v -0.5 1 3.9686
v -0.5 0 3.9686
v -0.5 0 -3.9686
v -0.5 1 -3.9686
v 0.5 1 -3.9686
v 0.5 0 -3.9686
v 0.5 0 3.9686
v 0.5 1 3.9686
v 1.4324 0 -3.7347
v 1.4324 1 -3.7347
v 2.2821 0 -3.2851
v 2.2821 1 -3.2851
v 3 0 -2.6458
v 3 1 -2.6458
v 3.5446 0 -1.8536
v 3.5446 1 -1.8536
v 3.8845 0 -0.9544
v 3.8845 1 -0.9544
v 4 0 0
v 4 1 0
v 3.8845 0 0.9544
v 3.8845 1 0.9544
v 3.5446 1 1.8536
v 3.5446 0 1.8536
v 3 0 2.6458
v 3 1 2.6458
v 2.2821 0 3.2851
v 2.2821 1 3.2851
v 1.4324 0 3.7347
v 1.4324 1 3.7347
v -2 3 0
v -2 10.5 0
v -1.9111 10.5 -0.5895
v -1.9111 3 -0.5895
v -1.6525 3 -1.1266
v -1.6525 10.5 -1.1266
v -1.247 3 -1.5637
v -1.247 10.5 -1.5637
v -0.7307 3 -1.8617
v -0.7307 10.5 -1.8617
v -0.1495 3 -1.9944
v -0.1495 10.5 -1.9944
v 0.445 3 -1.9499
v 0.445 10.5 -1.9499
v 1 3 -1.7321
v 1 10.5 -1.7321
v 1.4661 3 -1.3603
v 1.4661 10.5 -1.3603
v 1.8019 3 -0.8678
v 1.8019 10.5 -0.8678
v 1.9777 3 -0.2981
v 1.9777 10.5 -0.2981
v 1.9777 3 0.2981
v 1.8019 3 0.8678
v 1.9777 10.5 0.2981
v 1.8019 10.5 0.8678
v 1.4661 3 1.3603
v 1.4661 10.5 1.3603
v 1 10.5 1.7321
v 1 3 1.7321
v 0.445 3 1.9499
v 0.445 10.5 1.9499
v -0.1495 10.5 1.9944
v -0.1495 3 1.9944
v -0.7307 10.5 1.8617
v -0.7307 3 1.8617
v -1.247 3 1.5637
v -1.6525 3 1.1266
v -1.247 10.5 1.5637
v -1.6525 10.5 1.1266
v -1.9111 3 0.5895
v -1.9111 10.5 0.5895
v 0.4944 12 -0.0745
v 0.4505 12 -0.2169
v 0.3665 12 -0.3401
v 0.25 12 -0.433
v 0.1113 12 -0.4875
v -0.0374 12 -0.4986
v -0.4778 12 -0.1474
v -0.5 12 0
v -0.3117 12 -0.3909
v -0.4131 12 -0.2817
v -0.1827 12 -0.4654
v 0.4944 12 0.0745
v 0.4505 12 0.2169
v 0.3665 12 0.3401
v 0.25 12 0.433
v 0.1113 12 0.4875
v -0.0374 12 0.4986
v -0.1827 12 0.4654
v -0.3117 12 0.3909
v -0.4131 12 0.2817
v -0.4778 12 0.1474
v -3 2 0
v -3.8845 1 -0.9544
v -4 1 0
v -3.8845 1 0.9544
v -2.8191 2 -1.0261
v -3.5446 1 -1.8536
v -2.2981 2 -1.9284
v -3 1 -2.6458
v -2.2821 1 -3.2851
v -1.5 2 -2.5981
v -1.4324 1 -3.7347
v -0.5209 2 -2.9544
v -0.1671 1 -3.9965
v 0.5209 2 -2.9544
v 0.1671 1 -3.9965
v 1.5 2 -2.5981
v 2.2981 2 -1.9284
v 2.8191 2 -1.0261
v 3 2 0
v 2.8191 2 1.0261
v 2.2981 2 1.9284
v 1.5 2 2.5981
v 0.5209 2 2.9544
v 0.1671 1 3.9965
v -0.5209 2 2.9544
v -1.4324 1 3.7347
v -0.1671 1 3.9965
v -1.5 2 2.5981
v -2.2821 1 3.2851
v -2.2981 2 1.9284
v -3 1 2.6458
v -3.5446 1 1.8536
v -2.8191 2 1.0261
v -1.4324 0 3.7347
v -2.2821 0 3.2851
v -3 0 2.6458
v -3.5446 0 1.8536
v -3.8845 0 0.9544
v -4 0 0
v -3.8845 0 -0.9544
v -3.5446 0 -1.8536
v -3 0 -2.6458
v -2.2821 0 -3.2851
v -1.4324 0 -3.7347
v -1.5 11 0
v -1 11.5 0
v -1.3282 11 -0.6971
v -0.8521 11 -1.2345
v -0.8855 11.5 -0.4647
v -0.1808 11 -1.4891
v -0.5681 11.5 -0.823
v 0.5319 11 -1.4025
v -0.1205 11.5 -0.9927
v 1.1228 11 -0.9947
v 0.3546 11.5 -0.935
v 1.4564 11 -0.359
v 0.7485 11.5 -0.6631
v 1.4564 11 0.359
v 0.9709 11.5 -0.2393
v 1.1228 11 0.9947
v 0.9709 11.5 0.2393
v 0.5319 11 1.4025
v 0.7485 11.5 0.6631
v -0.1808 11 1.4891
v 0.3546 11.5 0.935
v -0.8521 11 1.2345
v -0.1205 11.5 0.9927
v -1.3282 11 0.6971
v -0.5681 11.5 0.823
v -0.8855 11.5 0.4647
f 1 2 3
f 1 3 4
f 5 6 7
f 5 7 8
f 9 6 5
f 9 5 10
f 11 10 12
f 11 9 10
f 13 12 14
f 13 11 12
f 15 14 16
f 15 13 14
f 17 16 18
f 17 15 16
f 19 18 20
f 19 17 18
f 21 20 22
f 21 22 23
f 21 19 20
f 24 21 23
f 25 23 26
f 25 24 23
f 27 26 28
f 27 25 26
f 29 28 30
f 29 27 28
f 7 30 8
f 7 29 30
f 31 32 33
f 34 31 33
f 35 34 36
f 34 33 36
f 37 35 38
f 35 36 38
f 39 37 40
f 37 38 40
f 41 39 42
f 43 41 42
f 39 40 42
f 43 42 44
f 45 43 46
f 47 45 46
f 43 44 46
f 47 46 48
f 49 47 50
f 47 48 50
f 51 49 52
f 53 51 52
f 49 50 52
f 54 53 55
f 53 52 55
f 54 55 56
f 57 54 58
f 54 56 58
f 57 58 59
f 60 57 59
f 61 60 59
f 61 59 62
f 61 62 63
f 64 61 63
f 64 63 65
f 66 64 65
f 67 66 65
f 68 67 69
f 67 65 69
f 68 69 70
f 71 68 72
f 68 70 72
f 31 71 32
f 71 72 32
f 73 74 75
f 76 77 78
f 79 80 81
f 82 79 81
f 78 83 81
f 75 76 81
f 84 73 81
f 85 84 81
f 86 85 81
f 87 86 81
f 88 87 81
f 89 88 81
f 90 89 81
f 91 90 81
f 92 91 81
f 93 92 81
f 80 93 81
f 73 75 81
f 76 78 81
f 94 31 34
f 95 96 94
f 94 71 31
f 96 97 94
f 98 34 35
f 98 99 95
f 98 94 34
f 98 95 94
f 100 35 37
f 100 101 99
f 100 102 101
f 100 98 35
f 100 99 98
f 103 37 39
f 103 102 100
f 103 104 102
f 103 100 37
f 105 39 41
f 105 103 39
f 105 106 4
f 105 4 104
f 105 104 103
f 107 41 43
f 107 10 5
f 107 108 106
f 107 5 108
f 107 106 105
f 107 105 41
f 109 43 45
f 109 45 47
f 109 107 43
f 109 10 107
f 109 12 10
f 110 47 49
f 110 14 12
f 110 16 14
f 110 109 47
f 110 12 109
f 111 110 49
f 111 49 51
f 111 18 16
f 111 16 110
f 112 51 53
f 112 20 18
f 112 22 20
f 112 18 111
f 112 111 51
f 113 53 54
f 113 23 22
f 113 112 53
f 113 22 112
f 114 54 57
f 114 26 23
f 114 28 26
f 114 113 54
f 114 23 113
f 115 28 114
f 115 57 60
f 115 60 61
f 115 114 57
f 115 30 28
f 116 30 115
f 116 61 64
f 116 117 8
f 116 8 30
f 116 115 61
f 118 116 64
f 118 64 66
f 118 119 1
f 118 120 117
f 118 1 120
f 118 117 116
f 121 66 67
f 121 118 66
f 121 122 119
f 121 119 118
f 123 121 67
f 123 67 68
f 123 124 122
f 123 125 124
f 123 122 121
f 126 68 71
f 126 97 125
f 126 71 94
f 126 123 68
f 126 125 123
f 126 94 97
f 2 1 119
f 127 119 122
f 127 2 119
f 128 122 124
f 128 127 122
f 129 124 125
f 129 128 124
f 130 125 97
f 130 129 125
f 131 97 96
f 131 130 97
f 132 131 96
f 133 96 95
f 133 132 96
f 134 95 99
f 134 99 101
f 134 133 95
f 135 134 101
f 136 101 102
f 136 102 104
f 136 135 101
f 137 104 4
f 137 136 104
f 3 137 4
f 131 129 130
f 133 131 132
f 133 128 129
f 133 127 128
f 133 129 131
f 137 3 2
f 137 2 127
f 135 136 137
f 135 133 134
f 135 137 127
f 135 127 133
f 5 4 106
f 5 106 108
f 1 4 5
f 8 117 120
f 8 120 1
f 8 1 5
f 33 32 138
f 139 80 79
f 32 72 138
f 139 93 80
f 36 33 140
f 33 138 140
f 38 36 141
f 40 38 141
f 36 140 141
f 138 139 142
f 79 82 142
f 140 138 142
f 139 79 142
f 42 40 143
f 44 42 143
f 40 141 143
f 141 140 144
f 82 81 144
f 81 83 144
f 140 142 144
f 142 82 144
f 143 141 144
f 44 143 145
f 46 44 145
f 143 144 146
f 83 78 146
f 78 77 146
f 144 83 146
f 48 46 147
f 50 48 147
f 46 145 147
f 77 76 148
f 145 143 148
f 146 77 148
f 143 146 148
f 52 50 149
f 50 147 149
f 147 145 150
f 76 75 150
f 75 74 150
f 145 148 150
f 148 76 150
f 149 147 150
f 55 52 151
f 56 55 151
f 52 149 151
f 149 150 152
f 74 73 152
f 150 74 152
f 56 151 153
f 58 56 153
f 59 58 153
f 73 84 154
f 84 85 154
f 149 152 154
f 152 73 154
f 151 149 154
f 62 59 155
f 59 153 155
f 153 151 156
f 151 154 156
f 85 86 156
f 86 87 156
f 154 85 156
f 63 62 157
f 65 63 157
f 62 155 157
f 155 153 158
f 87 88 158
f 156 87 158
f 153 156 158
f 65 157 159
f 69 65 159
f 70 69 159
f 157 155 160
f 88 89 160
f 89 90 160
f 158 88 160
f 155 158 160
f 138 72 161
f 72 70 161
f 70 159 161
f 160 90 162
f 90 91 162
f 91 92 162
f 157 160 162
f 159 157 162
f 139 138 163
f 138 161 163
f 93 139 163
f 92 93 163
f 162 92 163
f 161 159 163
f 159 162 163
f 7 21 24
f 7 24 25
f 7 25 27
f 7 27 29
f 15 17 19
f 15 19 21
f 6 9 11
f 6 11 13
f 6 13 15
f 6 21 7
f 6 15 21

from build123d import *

# Parameters (mm, degrees)
SKETCH_1_W          = 2
SKETCH_1_H          = 9
SKETCH_2_W          = 1
SKETCH_2_H          = 1
CUT_EXTRUDE_1_DEPTH = 10
CHAMFER_1_SIZE      = 1.5


with BuildPart() as part:
    # Эскиз1 → Повернуть1 (revolve)
    with BuildSketch(Plane.XY):
        with Locations((-1, 7.5)):
            Rectangle(SKETCH_1_W, SKETCH_1_H)
        Polygon((-4, 0), (0, 0), (0, 3), (-2, 3), (-4, 1), align=None)
    revolve(axis=Axis((0, 12, 0), (0, -1, 0)))

    # Эскиз2 → Вырез-Вытянуть1 (cut, symmetric)
    with BuildSketch(Plane.XY):
        with Locations((0, 0.5)):
            Rectangle(SKETCH_2_W, SKETCH_2_H)
    extrude(amount=CUT_EXTRUDE_1_DEPTH, both=True, mode=Mode.SUBTRACT)

    # Фаска1
    chamfer_1_edges = [part.edges().sort_by_distance(p)[0] for p in [
        (2, 12, 0),
    ]]
    chamfer(chamfer_1_edges, length=CHAMFER_1_SIZE)


solid = part.part
